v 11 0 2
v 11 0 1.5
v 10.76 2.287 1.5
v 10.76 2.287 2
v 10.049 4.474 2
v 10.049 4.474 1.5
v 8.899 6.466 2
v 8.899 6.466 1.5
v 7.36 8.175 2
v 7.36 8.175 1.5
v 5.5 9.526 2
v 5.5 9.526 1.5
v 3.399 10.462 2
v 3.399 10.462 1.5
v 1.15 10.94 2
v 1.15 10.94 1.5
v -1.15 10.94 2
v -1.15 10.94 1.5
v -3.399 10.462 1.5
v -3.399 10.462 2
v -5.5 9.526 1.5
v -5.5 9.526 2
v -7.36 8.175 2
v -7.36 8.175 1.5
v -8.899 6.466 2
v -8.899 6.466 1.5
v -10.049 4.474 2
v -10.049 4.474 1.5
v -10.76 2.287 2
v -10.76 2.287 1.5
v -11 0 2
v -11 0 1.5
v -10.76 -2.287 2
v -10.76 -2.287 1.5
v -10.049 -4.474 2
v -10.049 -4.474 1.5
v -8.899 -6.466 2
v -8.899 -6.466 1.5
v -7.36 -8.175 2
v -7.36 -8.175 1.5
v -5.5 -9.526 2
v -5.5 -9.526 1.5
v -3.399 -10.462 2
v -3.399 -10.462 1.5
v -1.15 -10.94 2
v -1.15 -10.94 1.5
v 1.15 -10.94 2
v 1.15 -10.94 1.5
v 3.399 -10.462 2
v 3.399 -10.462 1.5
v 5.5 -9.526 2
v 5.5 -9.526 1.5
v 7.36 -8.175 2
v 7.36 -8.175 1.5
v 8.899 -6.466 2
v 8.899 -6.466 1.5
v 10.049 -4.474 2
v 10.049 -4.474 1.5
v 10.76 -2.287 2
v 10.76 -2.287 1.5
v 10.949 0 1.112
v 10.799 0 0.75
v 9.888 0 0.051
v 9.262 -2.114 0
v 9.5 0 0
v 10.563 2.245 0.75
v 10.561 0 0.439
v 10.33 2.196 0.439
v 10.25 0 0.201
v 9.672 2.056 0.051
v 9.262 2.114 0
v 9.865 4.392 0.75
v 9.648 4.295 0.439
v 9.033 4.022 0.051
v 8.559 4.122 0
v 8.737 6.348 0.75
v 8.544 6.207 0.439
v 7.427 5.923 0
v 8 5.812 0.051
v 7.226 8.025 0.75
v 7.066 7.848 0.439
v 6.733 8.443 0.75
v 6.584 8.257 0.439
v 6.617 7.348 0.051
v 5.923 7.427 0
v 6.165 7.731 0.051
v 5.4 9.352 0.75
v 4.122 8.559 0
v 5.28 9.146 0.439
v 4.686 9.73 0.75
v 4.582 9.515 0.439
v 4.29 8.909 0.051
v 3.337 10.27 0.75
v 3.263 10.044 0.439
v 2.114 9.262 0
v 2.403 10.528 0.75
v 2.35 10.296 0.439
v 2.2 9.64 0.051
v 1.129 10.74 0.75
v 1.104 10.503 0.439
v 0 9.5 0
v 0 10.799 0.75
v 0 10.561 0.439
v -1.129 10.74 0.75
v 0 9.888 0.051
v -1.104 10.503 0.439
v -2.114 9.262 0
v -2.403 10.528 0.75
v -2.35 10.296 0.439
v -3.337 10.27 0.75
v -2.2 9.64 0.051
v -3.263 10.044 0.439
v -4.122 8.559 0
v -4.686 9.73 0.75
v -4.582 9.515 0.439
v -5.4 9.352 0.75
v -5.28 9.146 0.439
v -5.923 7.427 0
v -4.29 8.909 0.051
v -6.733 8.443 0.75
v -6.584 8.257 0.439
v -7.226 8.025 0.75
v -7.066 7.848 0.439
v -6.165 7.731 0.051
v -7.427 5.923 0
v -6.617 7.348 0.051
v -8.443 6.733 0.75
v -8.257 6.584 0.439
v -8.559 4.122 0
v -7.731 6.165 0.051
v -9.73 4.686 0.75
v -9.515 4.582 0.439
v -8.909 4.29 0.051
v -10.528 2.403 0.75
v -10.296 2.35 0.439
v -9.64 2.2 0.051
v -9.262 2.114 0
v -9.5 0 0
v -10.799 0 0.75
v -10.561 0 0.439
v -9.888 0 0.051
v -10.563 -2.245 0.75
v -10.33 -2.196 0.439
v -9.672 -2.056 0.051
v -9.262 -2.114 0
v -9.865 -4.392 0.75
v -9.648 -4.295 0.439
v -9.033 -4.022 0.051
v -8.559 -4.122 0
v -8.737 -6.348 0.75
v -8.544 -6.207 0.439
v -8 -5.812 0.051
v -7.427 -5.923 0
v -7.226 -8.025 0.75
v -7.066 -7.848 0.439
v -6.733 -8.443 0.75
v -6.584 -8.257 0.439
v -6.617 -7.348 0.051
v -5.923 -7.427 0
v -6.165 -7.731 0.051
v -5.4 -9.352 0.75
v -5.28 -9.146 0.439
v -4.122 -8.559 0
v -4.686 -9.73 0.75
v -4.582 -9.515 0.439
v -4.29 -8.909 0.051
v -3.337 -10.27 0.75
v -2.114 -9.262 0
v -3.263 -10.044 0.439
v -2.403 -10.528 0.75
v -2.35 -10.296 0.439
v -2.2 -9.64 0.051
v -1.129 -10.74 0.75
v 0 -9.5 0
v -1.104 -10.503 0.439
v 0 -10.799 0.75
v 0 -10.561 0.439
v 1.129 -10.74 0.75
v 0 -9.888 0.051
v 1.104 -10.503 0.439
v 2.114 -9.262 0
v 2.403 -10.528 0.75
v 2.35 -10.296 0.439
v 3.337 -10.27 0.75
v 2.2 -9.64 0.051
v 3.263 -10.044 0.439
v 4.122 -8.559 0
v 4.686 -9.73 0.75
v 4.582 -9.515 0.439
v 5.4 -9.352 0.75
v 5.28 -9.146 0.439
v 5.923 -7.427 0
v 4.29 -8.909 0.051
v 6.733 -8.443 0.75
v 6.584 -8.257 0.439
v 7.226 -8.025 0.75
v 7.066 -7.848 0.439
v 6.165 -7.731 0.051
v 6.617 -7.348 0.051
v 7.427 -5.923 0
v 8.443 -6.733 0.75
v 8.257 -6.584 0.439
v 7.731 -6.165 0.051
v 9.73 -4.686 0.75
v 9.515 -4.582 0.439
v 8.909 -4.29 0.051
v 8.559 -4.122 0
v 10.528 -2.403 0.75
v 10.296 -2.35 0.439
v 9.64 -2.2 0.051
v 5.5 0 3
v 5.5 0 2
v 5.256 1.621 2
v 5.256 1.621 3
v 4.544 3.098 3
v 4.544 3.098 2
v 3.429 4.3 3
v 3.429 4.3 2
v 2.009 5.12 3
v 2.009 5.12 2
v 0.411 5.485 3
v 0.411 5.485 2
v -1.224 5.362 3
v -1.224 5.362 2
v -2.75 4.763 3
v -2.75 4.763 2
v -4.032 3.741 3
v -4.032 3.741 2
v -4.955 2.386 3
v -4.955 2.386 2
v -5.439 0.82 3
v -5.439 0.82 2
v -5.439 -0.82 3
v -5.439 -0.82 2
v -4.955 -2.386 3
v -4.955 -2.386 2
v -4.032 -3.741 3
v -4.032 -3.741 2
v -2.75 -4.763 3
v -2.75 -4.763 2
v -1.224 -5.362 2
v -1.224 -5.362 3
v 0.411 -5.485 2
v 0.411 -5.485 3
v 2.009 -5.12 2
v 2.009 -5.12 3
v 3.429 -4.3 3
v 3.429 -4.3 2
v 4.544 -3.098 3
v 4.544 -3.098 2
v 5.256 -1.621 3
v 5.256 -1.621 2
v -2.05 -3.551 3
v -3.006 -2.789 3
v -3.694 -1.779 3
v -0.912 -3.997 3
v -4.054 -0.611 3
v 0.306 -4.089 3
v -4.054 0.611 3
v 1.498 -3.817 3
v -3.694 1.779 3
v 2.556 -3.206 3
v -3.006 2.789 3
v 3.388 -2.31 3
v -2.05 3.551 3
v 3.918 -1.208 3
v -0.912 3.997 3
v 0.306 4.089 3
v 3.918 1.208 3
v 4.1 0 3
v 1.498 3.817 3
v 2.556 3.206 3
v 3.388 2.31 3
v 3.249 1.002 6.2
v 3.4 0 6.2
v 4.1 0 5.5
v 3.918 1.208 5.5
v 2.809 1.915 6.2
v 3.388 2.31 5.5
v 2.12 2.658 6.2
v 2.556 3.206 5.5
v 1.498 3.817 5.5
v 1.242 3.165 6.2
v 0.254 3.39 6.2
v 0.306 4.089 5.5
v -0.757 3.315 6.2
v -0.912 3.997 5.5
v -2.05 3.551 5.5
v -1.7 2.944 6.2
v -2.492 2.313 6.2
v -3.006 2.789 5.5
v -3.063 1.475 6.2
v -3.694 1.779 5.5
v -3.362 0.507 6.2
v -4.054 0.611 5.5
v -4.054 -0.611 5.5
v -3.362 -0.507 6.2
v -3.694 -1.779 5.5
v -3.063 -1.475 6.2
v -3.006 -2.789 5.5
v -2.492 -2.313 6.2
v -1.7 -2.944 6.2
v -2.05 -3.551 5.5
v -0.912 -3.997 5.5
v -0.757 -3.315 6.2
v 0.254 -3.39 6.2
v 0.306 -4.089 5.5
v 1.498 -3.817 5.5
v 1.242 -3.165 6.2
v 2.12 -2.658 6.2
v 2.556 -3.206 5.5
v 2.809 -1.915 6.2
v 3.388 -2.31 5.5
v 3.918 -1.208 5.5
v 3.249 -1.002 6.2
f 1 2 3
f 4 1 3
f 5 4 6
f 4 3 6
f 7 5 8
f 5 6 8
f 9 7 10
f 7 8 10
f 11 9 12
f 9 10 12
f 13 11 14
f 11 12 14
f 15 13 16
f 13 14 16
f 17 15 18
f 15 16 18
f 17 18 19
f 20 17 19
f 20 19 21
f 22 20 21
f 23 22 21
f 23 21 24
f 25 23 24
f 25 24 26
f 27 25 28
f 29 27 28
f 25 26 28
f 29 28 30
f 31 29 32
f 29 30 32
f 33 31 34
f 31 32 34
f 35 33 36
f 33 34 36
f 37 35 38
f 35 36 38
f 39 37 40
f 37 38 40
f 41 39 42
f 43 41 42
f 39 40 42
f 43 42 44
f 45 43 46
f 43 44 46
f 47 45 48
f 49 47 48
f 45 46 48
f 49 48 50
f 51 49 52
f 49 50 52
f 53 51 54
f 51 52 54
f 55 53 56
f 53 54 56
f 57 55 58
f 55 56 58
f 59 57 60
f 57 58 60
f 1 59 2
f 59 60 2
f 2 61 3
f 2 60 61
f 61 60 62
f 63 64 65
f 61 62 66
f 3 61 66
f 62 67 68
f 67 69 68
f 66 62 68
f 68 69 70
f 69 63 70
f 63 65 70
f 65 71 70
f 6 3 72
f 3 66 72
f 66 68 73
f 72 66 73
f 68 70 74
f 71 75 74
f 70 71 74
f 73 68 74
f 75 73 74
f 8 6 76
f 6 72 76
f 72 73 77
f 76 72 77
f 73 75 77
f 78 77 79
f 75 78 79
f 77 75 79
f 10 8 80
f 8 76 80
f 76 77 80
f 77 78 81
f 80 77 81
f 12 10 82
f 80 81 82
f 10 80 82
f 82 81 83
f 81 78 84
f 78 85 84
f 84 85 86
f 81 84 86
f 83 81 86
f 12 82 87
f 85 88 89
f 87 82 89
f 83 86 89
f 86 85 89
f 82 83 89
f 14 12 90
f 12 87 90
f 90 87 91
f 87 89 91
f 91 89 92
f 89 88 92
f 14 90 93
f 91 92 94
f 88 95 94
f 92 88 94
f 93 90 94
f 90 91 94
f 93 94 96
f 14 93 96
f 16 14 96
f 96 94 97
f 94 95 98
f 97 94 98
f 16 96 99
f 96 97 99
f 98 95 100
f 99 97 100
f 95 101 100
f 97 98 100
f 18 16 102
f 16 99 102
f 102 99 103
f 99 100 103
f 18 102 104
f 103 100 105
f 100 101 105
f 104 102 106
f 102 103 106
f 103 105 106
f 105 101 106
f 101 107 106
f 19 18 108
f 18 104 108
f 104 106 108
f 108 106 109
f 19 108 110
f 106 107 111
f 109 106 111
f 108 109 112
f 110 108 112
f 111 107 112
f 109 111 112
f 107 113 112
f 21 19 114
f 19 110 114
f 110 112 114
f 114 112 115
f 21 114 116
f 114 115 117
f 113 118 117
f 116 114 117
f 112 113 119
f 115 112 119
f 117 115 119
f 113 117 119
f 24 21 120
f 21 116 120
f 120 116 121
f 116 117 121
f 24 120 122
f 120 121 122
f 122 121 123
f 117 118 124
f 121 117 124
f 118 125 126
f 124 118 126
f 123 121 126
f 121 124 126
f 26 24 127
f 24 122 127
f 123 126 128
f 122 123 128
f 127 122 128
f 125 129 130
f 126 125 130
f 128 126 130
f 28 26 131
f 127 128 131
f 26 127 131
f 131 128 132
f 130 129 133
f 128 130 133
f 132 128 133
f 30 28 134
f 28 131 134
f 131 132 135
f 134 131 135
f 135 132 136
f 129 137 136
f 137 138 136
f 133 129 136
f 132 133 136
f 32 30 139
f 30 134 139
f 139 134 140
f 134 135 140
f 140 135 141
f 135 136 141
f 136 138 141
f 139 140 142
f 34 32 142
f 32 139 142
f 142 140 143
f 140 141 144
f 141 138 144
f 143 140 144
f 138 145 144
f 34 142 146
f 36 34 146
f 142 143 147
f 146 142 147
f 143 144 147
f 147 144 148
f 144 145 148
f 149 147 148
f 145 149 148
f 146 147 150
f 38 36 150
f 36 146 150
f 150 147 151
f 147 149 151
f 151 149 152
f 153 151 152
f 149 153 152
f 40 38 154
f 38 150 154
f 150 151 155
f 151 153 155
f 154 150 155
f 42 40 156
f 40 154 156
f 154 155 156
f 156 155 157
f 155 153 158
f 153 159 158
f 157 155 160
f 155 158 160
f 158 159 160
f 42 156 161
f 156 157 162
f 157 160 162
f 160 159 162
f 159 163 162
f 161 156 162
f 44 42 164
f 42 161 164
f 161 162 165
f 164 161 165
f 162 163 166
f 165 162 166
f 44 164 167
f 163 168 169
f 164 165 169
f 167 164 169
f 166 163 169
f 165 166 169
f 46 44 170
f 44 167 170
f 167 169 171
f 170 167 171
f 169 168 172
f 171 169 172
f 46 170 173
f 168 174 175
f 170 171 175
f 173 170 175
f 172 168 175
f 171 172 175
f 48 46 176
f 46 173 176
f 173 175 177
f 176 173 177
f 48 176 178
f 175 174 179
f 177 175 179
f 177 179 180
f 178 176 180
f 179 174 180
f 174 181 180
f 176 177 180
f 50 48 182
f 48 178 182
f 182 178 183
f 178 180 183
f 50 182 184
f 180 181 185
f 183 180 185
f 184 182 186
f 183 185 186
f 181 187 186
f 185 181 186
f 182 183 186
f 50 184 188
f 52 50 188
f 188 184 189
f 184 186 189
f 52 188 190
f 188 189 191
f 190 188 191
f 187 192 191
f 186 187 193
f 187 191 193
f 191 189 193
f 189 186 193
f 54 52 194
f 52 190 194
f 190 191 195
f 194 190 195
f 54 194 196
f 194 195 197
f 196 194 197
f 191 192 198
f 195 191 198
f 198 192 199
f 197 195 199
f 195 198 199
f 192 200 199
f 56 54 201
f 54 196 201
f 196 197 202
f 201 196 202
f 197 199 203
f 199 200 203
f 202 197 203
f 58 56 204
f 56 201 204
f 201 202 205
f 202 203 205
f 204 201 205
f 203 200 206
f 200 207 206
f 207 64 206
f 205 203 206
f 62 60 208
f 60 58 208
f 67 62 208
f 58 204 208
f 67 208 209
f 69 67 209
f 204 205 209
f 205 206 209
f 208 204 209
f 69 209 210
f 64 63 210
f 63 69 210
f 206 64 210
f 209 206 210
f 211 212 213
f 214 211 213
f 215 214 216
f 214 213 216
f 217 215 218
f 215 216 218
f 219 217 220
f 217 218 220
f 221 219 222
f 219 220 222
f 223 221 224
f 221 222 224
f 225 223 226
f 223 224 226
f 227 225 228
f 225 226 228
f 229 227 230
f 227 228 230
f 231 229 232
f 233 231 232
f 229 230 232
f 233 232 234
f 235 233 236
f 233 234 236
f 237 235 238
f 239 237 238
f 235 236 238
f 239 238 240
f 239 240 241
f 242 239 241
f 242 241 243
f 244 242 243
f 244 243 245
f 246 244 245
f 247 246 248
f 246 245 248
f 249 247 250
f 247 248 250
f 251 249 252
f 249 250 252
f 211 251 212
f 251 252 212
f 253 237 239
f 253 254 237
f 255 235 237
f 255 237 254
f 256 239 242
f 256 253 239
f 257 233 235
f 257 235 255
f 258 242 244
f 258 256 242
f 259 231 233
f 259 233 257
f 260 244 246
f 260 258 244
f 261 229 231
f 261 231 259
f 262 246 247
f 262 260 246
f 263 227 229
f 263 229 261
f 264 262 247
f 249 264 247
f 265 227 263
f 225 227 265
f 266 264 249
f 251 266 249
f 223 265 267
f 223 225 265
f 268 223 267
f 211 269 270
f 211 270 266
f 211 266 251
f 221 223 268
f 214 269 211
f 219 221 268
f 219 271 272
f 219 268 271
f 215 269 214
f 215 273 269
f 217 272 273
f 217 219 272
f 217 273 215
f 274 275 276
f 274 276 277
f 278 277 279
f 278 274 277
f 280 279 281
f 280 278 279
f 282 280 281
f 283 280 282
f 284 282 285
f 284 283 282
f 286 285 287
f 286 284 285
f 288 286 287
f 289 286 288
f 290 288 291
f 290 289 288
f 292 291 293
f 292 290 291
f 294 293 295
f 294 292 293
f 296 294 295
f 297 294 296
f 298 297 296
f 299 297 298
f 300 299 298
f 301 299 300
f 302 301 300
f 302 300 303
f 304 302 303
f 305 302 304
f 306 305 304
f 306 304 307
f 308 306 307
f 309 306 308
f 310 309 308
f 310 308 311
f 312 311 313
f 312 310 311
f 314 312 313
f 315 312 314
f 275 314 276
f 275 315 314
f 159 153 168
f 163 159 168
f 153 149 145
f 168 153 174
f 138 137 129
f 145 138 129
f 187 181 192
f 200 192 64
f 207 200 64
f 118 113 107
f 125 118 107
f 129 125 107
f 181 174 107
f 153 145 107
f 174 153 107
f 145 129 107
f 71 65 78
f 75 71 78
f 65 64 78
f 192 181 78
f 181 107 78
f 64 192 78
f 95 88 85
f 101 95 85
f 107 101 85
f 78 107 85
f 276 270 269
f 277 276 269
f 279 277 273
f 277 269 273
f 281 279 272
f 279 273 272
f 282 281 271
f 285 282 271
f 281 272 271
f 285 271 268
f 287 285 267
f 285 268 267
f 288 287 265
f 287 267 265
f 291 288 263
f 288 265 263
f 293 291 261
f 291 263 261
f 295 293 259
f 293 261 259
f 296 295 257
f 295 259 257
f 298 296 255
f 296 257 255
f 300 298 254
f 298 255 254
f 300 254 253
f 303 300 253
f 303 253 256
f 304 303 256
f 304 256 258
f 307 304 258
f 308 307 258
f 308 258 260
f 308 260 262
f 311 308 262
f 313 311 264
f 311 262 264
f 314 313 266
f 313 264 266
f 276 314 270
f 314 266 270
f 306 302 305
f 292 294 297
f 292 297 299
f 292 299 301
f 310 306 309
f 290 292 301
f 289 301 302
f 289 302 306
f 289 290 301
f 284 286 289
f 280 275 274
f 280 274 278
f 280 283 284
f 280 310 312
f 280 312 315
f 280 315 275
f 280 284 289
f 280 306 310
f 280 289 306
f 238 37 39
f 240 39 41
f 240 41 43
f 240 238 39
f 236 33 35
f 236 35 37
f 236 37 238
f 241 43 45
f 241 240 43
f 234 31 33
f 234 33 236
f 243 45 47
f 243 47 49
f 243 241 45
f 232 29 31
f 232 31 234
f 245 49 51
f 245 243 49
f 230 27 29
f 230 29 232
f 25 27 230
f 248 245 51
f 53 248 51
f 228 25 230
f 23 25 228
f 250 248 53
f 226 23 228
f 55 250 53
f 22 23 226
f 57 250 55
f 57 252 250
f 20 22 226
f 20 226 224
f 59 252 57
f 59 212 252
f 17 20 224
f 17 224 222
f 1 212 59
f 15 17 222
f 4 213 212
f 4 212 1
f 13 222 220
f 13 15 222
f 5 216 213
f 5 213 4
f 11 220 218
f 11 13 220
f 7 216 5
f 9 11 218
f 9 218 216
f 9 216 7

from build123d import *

# Parameters (mm, degrees)
F0_R     = 11
F1_DEPTH = 2
F2_R     = 5.5
F3_DEPTH = 1
F4_R     = 4.1
F5_DEPTH = 3.2
F6_R     = 1.5
F7_SIZE  = 0.7


with BuildPart() as f1:
    # F0 (on Top) → F1 (new body)
    with BuildSketch(Plane.XY):
        Circle(F0_R)
    extrude(amount=F1_DEPTH)

    # F2 (on face) → F3 (join)
    with BuildSketch(Plane.XY.offset(2)):
        Circle(F2_R)
    extrude(amount=F3_DEPTH)

    # F4 (on face) → F5 (join)
    with BuildSketch(Plane.XY.offset(3)):
        Circle(F4_R)
    extrude(amount=F5_DEPTH)

    # F6
    f6_edges = [f1.edges().sort_by_distance(p)[0] for p in [
        (-11, 0, 0),
    ]]
    fillet(f6_edges, radius=F6_R)

    # F7
    f7_edges = [f1.edges().sort_by_distance(p)[0] for p in [
        (-4.1, 0, 6.2),
    ]]
    chamfer(f7_edges, length=F7_SIZE)


solid = f1.part
